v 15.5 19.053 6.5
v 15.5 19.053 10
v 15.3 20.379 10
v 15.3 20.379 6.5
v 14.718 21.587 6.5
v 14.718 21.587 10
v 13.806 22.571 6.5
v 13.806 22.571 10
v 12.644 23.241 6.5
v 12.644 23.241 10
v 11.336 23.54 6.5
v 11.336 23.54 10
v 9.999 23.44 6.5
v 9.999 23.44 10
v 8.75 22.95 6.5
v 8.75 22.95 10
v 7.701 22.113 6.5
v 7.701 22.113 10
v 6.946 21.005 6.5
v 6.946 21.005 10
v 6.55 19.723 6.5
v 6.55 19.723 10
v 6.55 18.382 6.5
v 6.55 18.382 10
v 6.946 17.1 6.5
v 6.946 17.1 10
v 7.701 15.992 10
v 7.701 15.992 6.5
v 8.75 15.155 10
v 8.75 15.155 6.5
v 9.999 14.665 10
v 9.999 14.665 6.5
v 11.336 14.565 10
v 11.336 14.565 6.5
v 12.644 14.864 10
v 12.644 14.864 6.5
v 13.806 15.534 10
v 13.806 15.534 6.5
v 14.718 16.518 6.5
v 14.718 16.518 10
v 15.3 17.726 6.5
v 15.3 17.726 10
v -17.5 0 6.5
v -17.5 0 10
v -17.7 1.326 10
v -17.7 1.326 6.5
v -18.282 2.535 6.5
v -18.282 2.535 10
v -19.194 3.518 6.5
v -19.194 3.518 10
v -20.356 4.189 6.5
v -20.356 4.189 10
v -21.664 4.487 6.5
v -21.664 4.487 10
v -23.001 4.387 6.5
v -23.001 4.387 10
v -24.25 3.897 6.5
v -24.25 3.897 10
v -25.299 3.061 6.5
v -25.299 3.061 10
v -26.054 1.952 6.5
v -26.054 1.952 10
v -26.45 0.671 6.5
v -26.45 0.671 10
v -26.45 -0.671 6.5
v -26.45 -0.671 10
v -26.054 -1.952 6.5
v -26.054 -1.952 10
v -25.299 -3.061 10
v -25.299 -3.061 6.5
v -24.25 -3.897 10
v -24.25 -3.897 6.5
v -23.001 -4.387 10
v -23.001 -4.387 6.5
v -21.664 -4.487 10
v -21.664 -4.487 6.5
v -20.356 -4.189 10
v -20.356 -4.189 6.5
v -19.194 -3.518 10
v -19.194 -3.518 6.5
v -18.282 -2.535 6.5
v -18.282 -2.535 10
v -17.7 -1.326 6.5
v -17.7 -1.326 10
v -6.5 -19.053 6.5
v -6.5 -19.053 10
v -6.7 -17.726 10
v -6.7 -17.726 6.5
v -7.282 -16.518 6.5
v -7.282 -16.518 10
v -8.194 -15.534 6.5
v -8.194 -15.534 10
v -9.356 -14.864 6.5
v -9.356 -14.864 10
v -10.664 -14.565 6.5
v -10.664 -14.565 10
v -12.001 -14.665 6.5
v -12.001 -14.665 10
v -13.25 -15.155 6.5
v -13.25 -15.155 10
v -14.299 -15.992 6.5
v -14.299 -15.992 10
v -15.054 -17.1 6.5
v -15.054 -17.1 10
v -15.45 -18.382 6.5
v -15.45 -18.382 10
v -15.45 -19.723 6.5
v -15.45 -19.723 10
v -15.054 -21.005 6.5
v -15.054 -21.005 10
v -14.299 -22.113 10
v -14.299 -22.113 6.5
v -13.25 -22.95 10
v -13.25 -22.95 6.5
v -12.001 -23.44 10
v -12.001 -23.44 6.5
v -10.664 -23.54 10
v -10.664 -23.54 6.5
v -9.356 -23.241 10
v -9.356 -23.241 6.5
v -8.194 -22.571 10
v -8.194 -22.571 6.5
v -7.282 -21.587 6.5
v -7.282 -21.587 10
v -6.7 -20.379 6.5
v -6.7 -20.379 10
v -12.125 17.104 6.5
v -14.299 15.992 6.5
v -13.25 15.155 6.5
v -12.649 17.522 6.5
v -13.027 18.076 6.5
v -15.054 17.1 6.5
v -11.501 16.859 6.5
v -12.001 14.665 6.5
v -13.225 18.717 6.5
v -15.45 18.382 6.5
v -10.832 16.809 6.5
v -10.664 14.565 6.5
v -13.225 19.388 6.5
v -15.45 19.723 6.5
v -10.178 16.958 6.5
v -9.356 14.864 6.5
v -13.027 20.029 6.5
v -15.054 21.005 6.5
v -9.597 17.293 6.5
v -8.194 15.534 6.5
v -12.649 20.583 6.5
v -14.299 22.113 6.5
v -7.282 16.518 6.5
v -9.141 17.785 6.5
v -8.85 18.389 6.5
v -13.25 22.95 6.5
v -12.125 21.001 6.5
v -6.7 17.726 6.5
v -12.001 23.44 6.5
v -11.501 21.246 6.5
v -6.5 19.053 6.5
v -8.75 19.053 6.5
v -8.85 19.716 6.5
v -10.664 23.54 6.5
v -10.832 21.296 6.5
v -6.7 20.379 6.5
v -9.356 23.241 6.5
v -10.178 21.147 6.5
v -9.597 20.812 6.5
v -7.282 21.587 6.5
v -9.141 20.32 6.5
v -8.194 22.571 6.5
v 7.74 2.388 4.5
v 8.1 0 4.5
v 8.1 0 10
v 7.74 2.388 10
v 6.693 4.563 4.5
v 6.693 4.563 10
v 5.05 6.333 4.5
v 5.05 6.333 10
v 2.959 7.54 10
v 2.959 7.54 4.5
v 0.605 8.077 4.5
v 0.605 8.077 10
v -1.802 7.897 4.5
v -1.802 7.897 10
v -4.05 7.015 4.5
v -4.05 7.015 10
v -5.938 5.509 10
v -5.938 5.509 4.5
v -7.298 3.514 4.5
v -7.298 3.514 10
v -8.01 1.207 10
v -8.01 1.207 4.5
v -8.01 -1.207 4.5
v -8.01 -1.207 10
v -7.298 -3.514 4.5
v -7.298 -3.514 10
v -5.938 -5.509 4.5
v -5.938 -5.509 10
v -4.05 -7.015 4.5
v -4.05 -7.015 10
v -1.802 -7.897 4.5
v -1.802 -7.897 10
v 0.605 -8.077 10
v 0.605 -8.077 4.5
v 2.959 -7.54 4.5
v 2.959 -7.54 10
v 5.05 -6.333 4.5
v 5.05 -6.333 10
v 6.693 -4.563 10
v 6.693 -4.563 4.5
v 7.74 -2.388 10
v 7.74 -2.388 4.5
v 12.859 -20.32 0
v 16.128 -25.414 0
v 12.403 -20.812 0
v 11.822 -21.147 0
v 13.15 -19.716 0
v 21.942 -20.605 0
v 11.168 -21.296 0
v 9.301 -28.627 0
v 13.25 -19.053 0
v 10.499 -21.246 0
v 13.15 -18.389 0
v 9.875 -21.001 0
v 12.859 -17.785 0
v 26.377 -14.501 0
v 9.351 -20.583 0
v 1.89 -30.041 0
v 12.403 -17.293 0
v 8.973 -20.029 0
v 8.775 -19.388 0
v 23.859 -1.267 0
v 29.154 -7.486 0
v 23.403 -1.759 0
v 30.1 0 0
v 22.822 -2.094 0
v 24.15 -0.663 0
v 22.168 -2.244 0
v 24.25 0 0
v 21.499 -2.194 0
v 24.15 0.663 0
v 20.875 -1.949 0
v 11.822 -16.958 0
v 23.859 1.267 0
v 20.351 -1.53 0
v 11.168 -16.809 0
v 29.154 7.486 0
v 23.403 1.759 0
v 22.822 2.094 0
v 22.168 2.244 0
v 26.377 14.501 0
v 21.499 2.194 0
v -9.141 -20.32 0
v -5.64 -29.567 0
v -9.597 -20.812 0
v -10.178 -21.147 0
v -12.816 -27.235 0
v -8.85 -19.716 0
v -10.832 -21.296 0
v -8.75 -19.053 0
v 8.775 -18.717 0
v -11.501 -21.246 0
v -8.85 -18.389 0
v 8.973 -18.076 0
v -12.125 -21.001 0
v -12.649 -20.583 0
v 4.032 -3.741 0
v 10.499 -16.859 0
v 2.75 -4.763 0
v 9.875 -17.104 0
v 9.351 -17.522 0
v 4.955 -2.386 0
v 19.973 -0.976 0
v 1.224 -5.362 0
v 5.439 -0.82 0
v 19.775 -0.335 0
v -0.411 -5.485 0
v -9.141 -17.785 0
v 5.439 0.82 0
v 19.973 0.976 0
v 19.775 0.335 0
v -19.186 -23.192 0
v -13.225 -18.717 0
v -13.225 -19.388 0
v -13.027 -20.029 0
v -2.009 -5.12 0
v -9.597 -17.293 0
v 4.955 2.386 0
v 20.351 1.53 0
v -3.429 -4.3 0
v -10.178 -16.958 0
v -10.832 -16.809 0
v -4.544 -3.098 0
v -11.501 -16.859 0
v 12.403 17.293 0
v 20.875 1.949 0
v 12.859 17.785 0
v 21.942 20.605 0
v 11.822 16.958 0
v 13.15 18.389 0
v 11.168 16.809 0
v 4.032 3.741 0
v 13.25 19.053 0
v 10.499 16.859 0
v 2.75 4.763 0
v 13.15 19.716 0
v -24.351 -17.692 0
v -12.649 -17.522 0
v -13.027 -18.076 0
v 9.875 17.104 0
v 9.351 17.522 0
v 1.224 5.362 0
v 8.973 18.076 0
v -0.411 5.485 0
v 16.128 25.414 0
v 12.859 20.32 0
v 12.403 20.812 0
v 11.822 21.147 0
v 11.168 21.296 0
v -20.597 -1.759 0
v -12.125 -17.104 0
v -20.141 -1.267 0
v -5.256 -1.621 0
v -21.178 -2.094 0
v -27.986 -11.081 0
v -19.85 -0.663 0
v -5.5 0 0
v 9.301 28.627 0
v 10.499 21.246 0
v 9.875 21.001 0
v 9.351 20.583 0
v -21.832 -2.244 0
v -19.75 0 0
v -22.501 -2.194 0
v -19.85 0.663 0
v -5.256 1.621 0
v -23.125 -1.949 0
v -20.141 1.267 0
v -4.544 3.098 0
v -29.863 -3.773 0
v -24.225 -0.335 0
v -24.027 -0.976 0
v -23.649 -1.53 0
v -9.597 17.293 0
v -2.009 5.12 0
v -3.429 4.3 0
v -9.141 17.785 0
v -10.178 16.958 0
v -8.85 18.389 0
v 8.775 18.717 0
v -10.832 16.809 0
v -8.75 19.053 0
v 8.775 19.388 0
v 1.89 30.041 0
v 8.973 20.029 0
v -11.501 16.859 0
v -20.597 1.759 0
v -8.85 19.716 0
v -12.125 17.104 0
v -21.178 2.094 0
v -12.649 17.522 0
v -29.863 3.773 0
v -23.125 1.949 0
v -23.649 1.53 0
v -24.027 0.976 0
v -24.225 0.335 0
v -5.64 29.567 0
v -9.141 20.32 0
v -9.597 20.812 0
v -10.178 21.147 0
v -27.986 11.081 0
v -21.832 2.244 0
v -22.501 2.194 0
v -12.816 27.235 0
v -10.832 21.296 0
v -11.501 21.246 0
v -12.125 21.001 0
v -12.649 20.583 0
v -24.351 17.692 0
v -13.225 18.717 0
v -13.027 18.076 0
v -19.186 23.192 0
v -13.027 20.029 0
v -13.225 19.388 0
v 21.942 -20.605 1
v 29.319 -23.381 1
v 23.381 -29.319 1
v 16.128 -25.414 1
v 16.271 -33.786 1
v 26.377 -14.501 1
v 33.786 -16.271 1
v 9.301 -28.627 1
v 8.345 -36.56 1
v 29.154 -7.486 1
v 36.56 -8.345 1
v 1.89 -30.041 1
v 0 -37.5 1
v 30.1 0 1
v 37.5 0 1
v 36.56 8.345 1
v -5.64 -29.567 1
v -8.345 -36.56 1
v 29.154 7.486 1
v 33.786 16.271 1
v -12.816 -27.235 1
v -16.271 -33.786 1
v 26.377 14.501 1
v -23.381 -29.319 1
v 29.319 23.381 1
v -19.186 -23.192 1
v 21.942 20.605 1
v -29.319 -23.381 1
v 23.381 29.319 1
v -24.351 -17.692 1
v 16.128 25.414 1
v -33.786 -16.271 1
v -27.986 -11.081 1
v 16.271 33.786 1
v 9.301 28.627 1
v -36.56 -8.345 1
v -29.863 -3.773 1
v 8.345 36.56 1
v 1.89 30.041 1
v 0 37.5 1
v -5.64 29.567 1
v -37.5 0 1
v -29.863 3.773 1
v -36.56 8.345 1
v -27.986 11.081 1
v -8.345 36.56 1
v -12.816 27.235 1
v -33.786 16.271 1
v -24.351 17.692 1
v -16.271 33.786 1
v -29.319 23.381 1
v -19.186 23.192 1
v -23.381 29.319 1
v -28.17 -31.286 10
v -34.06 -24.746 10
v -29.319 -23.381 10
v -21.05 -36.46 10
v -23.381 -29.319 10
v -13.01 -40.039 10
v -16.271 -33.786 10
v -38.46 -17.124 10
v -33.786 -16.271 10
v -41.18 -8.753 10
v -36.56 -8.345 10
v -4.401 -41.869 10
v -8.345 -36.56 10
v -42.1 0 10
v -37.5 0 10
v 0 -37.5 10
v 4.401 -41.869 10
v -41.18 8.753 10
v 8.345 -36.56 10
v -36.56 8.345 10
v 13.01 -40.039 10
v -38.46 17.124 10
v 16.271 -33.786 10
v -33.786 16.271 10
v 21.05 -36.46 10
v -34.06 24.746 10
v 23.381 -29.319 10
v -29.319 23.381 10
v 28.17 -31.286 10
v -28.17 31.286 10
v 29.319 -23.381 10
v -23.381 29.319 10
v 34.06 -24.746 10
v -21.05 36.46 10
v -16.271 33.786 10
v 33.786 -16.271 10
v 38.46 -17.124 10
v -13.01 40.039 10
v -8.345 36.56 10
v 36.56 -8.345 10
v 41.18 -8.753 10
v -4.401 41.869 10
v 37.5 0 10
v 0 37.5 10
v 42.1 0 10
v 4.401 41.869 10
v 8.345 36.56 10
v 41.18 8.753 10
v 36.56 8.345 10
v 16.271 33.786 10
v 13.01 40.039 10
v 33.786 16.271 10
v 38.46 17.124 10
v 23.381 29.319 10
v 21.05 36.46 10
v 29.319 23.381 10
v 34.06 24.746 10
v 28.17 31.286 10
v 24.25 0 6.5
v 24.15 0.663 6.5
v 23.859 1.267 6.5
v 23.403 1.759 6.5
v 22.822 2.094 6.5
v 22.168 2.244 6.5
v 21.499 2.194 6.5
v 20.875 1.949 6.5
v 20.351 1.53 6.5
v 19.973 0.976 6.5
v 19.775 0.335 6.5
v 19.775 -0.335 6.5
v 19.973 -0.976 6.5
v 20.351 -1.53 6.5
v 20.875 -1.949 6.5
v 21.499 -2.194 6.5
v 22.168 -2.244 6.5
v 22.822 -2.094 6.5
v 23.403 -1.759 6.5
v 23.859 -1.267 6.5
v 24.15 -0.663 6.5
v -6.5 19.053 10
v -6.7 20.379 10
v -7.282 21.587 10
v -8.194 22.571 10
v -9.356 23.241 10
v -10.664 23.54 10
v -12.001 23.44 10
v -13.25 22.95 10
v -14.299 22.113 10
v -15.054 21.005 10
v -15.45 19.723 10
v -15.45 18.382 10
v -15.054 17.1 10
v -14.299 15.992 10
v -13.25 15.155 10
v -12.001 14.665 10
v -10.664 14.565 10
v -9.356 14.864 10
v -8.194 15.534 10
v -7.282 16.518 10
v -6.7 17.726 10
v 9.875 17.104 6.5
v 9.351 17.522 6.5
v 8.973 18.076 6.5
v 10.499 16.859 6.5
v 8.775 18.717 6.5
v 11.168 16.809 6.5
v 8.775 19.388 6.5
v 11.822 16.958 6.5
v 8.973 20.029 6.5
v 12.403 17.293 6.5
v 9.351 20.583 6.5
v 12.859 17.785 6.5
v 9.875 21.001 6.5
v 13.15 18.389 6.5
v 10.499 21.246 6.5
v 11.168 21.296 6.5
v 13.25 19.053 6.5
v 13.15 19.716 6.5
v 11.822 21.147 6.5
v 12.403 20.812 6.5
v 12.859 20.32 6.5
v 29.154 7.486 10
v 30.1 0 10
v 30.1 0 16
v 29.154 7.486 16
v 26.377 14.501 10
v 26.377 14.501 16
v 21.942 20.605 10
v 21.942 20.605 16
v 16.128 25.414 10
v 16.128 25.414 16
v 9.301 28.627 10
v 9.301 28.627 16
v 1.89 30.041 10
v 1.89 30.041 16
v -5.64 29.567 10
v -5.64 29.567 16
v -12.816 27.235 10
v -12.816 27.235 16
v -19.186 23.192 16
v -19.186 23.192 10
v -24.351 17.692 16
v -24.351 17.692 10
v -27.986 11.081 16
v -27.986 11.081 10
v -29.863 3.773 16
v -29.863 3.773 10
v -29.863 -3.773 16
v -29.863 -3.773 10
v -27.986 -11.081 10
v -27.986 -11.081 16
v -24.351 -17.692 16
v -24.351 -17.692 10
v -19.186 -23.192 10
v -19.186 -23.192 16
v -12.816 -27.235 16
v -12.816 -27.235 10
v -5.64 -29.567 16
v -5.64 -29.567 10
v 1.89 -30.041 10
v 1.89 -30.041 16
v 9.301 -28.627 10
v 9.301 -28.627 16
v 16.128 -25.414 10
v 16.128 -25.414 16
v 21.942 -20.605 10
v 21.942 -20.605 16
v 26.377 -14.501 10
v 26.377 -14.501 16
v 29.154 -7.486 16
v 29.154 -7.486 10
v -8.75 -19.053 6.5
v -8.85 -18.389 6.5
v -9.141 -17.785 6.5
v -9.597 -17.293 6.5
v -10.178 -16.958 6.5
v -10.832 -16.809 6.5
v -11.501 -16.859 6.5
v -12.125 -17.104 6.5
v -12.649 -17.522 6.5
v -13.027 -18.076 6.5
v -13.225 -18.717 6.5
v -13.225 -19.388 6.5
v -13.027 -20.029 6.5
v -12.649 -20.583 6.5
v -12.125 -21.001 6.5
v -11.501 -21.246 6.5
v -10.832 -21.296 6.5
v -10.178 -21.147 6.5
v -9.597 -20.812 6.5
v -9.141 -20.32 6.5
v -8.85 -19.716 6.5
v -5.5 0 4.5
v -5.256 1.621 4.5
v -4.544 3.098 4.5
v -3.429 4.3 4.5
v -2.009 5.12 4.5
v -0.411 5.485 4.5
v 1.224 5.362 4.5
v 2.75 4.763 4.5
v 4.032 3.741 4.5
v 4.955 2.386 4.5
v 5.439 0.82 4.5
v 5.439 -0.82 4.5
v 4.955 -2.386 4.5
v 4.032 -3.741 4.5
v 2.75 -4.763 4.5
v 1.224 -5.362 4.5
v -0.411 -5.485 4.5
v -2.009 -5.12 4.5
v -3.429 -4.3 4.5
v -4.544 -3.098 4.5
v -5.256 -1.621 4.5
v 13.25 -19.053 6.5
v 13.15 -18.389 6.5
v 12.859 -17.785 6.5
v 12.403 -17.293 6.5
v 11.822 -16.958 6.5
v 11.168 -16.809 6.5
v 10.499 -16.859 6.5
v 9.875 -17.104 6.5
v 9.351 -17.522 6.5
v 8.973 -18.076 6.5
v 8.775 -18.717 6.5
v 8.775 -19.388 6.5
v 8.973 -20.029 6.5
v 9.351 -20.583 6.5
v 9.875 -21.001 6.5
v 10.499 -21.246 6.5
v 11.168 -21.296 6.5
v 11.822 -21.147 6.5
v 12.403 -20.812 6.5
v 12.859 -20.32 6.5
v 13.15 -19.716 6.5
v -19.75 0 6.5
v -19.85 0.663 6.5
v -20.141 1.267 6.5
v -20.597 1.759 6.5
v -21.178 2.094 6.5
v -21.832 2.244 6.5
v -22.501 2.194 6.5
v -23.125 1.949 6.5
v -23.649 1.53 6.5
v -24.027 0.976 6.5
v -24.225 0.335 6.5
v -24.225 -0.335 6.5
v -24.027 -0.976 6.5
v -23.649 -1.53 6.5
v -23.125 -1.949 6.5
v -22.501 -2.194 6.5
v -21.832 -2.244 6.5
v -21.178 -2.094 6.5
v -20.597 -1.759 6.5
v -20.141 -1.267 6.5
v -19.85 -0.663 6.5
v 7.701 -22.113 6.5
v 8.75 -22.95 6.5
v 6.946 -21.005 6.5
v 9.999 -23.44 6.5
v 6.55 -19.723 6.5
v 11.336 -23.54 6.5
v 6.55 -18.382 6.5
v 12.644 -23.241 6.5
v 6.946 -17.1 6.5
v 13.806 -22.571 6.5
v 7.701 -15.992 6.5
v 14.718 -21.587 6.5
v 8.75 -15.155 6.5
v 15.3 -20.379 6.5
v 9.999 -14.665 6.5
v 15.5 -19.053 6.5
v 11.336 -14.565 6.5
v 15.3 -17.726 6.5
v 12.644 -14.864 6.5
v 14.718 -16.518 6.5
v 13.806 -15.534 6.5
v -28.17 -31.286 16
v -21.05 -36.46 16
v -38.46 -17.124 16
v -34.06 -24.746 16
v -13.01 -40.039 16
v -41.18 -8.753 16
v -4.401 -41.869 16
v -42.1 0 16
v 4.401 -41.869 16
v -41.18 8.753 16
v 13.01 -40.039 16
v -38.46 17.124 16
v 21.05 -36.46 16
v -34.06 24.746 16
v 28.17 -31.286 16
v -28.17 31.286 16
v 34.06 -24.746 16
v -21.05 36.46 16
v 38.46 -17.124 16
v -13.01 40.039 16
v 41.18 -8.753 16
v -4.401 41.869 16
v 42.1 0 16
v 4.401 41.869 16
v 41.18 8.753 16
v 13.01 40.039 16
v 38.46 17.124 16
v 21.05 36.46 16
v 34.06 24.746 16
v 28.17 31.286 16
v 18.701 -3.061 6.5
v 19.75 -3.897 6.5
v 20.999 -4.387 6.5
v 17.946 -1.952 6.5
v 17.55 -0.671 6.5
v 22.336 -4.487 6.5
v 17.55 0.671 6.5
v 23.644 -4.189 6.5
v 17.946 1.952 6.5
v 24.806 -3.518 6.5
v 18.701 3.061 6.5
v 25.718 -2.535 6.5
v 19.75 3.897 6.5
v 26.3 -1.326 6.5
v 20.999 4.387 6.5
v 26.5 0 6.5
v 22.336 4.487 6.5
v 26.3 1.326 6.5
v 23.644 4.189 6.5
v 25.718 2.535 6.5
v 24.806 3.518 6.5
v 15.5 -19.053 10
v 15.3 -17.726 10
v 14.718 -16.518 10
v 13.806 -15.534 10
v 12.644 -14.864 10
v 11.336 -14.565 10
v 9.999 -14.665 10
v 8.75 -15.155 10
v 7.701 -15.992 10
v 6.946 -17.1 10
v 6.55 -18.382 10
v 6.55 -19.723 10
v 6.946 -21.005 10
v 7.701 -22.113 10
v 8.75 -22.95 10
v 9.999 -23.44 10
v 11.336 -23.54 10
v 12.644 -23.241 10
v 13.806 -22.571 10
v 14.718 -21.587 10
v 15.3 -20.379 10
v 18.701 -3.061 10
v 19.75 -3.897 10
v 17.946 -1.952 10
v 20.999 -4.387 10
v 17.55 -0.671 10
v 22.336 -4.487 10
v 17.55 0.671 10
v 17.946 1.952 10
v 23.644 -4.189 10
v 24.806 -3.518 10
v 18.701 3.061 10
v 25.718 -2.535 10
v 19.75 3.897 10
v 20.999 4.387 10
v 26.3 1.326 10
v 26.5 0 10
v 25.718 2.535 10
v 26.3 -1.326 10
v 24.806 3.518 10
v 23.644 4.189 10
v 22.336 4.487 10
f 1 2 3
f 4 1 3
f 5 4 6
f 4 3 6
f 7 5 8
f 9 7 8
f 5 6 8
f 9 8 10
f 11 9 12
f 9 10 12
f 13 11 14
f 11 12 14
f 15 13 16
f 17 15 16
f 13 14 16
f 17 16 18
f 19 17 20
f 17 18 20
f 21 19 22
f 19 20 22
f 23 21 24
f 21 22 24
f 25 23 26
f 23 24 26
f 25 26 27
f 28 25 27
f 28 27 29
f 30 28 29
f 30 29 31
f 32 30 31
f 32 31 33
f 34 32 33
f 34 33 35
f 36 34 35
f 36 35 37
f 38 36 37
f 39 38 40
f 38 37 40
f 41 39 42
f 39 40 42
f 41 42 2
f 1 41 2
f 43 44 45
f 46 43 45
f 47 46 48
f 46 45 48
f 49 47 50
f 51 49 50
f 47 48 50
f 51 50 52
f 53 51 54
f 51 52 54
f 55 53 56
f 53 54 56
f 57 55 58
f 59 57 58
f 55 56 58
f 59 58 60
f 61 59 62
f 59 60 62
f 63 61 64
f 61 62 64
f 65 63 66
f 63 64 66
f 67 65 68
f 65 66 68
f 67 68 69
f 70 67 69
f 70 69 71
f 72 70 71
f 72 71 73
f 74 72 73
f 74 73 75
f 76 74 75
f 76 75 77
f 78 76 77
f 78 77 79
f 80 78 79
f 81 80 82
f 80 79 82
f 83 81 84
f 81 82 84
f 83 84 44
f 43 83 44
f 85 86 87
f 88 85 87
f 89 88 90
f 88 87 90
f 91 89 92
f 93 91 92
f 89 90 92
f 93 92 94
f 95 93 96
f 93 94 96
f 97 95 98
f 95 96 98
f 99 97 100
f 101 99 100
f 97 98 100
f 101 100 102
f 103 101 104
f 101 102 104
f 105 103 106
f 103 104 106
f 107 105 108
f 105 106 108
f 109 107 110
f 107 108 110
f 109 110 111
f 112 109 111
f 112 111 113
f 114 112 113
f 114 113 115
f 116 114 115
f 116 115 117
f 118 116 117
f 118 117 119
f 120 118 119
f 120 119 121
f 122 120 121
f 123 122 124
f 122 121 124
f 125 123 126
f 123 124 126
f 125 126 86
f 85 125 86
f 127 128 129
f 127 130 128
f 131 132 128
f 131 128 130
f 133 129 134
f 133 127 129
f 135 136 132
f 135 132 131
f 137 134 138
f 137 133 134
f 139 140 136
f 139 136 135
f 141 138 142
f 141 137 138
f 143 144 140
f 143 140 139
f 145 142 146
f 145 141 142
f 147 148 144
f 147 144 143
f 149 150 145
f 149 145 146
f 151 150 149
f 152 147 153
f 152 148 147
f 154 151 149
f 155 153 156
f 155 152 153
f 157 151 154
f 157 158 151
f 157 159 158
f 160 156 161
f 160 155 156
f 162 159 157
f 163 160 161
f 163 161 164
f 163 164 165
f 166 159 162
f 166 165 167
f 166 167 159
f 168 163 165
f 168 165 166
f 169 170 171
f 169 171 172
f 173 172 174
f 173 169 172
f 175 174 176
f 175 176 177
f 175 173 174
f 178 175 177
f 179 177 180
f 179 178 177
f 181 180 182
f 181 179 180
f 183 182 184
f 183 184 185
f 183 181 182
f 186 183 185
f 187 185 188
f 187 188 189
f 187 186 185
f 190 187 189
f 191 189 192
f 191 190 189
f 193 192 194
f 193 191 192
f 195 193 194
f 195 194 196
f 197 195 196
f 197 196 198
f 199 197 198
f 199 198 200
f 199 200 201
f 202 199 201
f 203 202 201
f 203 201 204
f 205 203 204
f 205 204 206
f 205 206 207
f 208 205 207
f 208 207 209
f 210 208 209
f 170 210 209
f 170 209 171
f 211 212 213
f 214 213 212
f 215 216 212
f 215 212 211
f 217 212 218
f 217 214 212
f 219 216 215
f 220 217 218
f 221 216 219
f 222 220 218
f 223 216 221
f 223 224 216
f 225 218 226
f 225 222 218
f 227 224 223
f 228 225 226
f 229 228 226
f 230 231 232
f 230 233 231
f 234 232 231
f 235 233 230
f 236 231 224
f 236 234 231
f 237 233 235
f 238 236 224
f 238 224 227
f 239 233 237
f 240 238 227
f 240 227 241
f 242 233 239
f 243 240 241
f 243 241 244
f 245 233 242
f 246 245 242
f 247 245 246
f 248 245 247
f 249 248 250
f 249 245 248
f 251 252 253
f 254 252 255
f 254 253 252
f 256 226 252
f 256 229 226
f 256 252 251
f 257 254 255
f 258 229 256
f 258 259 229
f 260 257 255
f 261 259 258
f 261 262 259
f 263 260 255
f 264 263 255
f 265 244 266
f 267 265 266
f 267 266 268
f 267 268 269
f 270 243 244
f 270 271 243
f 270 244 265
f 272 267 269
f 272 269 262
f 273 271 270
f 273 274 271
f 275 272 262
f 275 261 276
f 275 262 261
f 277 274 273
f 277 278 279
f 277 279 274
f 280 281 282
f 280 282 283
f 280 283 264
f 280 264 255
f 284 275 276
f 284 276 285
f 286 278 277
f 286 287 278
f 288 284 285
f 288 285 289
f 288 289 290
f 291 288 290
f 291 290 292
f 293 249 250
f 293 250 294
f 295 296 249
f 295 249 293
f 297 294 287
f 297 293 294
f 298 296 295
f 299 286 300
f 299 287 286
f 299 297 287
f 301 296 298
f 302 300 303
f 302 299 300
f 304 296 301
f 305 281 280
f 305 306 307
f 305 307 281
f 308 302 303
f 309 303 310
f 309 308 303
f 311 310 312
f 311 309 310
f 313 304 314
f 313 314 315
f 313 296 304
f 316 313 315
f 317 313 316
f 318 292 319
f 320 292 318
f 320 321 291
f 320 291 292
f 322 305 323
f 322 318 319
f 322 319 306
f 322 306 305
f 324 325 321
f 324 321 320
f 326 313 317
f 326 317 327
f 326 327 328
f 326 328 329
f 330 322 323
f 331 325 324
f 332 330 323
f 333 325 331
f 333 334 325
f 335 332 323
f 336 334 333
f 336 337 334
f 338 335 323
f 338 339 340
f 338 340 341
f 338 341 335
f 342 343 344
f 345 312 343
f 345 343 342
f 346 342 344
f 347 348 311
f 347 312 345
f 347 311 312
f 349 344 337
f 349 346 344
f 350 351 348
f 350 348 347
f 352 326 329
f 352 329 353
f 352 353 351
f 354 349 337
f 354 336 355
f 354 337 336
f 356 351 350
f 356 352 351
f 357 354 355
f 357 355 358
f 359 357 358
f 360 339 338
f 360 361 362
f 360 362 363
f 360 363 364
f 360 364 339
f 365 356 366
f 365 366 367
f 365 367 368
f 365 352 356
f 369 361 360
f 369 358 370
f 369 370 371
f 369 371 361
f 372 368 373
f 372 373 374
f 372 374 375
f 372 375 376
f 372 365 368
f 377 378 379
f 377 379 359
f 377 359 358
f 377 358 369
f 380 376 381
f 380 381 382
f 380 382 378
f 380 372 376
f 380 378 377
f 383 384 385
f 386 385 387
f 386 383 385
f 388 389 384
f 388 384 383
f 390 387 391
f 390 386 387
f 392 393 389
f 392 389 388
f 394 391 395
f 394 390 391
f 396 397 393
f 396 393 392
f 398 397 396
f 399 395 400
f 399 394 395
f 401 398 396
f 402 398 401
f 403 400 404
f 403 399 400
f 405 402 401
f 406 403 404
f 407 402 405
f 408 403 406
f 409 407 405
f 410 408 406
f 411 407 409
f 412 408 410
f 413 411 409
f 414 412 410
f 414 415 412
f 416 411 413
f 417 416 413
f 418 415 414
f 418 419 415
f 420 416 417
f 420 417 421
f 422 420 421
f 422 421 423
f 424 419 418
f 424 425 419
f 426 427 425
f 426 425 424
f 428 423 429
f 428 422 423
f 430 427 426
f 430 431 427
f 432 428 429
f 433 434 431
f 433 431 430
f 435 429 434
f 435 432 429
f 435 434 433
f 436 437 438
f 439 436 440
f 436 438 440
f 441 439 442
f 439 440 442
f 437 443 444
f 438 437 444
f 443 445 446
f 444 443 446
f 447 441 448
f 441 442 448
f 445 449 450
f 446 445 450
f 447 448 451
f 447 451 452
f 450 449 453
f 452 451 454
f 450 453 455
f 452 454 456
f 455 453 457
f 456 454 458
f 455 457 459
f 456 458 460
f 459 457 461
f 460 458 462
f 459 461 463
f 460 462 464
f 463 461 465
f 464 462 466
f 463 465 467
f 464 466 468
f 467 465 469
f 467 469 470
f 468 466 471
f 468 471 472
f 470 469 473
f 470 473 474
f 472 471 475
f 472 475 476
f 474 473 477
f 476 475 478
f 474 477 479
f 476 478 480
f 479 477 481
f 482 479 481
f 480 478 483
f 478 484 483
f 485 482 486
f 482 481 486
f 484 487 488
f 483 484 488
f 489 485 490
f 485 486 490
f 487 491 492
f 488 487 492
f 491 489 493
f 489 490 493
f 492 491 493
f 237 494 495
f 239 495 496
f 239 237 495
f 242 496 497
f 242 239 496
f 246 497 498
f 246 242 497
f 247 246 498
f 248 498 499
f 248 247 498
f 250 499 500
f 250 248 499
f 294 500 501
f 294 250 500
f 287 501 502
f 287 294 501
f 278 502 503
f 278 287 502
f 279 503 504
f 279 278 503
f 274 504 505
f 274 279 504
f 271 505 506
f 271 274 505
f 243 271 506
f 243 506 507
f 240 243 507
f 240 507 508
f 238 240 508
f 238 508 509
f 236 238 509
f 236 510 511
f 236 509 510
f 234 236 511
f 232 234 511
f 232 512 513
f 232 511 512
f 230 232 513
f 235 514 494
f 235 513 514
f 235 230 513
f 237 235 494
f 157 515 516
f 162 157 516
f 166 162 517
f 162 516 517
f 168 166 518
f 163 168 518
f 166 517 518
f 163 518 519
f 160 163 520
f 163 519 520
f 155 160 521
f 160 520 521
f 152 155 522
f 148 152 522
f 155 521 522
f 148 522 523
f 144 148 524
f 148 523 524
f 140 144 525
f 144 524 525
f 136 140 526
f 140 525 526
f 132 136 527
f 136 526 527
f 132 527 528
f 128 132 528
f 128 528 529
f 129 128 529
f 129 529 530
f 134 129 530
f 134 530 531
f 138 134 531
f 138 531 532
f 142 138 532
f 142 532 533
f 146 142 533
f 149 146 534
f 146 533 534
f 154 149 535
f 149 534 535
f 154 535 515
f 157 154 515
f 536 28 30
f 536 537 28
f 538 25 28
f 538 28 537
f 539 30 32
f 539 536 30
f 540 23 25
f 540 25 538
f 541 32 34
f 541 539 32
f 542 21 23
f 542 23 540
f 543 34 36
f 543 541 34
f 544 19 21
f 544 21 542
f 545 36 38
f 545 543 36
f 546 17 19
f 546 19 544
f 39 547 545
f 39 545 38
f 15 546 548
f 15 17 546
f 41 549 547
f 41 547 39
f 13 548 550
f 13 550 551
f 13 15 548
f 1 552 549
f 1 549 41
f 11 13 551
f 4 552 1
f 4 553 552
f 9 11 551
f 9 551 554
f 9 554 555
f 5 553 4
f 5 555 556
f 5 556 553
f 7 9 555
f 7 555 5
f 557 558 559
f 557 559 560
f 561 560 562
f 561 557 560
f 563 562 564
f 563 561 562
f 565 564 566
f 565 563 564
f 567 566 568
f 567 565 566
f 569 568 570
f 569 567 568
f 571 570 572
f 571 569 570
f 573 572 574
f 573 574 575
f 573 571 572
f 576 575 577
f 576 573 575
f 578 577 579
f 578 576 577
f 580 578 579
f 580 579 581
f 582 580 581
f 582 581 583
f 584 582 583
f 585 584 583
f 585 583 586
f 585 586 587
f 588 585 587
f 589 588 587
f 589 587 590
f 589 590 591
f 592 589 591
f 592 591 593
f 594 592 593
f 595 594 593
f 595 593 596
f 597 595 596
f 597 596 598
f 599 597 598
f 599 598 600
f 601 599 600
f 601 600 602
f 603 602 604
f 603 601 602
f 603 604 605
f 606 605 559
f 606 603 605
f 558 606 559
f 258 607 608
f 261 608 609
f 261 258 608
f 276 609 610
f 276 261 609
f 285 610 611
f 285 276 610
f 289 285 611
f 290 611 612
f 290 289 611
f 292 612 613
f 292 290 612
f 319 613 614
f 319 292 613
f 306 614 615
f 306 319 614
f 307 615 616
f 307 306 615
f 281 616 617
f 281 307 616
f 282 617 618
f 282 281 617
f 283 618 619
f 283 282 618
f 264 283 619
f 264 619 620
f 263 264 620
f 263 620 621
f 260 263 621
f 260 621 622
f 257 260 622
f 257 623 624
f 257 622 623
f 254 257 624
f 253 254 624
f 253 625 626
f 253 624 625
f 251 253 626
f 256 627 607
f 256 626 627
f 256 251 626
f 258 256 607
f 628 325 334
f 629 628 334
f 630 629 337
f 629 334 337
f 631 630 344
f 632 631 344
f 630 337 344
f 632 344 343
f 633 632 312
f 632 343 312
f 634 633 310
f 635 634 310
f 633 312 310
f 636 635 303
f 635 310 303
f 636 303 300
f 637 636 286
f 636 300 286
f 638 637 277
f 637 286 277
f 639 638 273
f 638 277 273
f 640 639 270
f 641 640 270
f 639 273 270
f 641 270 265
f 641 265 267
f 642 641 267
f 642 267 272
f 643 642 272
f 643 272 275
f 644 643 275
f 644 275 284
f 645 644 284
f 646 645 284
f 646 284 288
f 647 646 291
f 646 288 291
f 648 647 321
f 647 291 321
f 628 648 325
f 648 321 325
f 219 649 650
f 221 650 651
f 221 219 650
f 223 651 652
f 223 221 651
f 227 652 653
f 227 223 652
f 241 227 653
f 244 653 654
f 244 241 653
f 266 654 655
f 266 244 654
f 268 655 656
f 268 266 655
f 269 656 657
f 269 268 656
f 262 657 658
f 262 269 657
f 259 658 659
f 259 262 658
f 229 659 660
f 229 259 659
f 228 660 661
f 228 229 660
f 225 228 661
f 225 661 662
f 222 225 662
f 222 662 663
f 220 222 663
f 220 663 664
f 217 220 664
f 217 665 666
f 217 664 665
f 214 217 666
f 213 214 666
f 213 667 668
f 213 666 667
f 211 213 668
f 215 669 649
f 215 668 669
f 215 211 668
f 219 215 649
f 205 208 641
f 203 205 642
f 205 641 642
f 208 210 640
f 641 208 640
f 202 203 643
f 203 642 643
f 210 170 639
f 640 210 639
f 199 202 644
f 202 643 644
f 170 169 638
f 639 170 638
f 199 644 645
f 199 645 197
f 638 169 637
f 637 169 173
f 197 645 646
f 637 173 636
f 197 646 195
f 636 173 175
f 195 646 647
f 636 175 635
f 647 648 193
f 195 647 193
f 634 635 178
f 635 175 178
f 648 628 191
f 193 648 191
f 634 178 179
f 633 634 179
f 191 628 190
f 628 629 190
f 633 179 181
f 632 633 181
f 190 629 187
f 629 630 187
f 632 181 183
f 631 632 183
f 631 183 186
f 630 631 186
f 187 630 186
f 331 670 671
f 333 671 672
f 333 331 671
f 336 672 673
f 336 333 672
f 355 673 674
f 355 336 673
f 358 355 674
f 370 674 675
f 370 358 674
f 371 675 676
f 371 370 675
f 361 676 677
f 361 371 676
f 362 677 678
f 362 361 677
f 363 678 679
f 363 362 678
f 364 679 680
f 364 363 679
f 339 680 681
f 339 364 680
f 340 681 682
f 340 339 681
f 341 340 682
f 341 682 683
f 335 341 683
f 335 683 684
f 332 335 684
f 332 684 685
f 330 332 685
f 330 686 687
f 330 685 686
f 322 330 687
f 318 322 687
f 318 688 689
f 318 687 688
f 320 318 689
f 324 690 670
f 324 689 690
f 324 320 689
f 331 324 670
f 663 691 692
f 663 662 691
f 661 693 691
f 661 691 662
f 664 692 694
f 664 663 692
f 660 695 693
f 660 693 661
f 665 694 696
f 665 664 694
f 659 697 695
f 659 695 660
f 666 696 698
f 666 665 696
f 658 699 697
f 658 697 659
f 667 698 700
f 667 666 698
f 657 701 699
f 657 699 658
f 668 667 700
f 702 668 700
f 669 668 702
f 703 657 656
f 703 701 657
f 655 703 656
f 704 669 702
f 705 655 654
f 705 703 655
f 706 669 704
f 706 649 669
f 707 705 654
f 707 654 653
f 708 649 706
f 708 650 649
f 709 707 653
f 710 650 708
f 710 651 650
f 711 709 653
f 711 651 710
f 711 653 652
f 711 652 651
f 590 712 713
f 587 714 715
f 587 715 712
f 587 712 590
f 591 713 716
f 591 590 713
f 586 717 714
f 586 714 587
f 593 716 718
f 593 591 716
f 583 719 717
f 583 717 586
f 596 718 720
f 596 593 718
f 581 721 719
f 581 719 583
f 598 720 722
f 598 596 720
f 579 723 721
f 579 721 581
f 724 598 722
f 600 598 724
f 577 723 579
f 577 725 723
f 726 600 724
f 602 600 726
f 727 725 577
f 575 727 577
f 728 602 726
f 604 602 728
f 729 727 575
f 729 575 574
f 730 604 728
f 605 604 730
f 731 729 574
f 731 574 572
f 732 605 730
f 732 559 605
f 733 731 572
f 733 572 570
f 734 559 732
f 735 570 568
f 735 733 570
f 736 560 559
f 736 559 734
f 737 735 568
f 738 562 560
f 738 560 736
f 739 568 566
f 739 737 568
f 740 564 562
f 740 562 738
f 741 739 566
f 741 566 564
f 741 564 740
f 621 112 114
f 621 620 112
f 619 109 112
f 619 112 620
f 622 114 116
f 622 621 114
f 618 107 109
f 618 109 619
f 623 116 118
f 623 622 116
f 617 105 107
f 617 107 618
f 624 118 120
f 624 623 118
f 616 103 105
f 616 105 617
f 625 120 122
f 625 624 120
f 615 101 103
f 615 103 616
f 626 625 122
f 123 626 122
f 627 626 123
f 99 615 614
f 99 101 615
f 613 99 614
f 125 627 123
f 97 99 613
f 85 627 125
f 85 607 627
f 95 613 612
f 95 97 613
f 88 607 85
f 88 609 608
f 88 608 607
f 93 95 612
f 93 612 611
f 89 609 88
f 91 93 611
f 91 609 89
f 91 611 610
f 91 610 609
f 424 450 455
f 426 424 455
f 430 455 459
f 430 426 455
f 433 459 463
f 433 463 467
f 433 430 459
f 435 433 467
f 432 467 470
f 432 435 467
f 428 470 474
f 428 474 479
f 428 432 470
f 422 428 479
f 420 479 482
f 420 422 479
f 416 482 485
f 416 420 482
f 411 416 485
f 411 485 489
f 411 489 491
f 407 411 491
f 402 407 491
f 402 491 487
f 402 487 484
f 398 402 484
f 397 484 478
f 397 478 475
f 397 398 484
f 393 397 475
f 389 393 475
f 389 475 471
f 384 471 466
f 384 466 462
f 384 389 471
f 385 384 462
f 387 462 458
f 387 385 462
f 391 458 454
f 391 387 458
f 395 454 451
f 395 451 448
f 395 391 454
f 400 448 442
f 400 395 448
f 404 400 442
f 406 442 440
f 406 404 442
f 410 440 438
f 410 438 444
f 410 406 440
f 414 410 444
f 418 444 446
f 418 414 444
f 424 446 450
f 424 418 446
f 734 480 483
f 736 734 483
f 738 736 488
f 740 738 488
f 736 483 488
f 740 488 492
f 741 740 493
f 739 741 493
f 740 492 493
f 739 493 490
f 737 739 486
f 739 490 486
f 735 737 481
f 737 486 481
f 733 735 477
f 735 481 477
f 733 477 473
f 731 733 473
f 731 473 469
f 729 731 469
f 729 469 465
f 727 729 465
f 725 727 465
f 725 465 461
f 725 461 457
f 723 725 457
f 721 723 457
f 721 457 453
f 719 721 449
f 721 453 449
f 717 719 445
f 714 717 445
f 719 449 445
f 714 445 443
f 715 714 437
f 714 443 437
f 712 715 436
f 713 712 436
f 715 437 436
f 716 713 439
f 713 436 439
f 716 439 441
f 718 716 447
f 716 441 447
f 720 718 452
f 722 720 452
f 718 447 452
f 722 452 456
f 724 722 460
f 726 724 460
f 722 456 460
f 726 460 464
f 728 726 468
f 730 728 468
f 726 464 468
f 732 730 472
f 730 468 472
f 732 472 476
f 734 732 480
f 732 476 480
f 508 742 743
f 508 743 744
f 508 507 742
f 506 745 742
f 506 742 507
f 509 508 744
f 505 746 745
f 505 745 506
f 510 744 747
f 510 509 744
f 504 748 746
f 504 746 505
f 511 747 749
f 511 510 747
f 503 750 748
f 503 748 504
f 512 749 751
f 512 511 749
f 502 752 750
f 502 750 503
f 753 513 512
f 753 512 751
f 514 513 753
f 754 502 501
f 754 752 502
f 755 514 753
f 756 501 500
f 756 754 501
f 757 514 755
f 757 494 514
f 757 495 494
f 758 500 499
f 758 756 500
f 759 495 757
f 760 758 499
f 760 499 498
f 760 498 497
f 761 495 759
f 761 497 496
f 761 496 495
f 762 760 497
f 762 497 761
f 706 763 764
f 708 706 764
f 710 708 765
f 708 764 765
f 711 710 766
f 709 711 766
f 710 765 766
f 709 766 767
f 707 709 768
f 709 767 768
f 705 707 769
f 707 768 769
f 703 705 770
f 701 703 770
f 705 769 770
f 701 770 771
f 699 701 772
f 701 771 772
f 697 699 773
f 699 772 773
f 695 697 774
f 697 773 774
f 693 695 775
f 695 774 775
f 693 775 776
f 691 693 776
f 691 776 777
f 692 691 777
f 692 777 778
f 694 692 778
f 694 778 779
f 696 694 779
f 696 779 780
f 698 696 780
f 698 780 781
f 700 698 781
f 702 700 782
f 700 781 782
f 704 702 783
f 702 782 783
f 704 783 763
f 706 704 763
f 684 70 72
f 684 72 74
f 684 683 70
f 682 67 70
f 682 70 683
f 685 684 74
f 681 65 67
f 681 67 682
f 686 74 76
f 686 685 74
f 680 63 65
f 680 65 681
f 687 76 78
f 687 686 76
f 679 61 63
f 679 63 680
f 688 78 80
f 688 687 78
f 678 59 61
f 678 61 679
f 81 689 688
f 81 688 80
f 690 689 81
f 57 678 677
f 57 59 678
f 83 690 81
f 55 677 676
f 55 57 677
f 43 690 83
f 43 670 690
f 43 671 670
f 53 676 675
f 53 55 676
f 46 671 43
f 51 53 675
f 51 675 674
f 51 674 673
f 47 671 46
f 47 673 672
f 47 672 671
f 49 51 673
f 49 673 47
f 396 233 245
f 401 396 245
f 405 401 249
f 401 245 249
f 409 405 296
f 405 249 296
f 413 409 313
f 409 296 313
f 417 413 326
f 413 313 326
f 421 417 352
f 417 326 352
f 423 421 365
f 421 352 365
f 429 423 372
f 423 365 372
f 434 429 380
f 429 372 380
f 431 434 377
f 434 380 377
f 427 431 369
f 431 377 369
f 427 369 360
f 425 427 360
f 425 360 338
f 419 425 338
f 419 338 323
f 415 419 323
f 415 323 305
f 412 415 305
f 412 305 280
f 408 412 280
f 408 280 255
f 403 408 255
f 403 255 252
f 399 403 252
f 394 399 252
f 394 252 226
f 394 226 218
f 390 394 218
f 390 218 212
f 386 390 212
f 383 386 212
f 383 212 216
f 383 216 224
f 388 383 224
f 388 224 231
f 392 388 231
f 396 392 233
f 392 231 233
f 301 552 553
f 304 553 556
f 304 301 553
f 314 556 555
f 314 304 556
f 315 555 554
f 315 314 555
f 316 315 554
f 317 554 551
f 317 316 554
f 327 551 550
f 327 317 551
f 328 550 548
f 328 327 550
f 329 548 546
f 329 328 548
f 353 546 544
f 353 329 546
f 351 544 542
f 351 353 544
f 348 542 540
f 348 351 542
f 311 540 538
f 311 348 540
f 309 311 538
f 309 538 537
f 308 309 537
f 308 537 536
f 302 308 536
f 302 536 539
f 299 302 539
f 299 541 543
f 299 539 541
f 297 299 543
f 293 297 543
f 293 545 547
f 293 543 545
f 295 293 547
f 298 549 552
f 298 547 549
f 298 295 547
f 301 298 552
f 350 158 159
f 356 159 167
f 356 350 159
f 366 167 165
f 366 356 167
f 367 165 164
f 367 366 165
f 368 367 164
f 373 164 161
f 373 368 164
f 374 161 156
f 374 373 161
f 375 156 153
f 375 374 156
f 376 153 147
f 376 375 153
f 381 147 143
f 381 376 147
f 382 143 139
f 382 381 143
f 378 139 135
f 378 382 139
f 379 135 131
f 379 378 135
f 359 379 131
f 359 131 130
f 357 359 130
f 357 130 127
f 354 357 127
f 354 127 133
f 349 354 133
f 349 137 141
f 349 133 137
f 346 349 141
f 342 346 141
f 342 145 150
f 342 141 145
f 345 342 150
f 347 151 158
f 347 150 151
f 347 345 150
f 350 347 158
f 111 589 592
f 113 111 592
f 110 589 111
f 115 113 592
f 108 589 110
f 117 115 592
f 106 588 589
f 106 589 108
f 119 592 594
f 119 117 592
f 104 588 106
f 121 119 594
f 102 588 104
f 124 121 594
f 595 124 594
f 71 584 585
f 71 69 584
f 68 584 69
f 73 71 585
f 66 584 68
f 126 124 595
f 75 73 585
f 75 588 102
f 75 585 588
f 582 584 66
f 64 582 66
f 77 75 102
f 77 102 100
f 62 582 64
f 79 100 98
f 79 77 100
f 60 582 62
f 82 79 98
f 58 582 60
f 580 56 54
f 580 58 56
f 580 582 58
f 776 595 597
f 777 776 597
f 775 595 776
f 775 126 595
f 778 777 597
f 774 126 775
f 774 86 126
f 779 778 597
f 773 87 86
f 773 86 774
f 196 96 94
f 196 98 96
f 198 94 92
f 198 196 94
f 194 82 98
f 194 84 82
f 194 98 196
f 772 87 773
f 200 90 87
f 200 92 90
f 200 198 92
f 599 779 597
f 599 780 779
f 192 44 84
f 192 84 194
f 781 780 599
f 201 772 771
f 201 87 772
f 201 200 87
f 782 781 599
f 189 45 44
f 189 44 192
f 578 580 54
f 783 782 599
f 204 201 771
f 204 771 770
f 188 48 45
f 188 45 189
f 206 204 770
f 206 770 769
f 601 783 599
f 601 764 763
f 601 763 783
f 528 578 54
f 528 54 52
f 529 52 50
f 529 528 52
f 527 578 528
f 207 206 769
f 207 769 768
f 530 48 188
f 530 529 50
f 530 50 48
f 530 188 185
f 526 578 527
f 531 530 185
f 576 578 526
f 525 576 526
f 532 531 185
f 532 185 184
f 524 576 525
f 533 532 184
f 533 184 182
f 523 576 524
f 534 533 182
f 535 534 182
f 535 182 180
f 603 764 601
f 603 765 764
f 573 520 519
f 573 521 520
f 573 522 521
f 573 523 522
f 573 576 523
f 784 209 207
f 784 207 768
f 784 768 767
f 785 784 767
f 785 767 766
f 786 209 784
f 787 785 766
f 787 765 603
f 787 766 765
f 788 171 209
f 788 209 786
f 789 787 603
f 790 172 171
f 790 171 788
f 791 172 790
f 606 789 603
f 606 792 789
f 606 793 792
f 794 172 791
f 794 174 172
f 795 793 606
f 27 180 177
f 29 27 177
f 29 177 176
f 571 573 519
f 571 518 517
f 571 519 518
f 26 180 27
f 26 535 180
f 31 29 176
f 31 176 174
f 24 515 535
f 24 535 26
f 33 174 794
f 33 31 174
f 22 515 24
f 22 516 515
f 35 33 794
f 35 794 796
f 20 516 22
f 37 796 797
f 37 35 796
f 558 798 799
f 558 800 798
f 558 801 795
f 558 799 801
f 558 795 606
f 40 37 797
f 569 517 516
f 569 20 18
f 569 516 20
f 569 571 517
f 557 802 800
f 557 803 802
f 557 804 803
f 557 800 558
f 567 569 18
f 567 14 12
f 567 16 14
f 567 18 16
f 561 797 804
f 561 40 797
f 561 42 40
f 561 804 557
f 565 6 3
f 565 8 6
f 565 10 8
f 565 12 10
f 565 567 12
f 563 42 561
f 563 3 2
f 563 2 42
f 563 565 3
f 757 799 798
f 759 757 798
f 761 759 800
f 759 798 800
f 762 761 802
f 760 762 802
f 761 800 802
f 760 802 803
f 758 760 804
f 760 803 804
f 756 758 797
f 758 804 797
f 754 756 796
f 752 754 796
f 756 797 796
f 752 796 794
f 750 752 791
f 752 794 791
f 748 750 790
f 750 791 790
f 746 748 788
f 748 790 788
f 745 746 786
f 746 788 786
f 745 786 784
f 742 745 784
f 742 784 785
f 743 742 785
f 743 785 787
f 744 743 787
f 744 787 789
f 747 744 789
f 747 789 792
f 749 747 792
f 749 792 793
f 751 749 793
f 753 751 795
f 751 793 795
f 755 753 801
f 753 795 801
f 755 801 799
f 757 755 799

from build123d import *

# Parameters (mm, degrees)
ESQUISSE1_R             = 30.1
ESQUISSE1_R_2           = 2.25
ESQUISSE1_R_3           = 8.1
BOSS_EXTRU_1_DEPTH      = 10
ESQUISSE2_R             = 8.1
ESQUISSE2_R_2           = 5.5
BOSS_EXTRU_2_DEPTH      = 4.5
ESQUISSE3_R             = 4.5
ENL_V_MAT_EXTRU_1_DEPTH = 3.5
ESQUISSE4_R             = 42.1
ESQUISSE4_R_2           = 30.1
BOSS_EXTRU_3_DEPTH      = 6
BOSS_EXTRU_4_START      = 9
ESQUISSE6_R             = 37.5
ESQUISSE6_R_2           = 30.1
BOSS_EXTRU_4_DEPTH      = 9


with BuildPart() as part:
    # Esquisse1 → Boss.-Extru.1 (new body)
    with BuildSketch(Plane.XY):
        Circle(ESQUISSE1_R)
        with Locations((22, 0)):
            Circle(ESQUISSE1_R_2, mode=Mode.SUBTRACT)
        with Locations((11, -19.052558883)):
            Circle(ESQUISSE1_R_2, mode=Mode.SUBTRACT)
        with Locations((-11, -19.052558883)):
            Circle(ESQUISSE1_R_2, mode=Mode.SUBTRACT)
        with Locations((-22, 0)):
            Circle(ESQUISSE1_R_2, mode=Mode.SUBTRACT)
        with Locations((-11, 19.052558883)):
            Circle(ESQUISSE1_R_2, mode=Mode.SUBTRACT)
        with Locations((11, 19.052558883)):
            Circle(ESQUISSE1_R_2, mode=Mode.SUBTRACT)
        Circle(ESQUISSE1_R_3, mode=Mode.SUBTRACT)
    extrude(amount=BOSS_EXTRU_1_DEPTH)

    # Esquisse2 → Boss.-Extru.2 (add)
    with BuildSketch(Plane(origin=(0, 0, 0), x_dir=(-1, 0, 0), z_dir=(0, 0, -1))):
        Circle(ESQUISSE2_R)
        Circle(ESQUISSE2_R_2, mode=Mode.SUBTRACT)
    extrude(amount=-BOSS_EXTRU_2_DEPTH)

    # Esquisse3 → Enlèv. mat.-Extru.1 (cut)
    with BuildSketch(Plane.XY.offset(10)):
        with Locations((-11, 19.052558883)):
            Circle(ESQUISSE3_R)
        with Locations((11, 19.052558883)):
            Circle(ESQUISSE3_R)
        with Locations((22, 0)):
            Circle(ESQUISSE3_R)
        with Locations((11, -19.052558883)):
            Circle(ESQUISSE3_R)
        with Locations((-11, -19.052558883)):
            Circle(ESQUISSE3_R)
        with Locations((-22, 0)):
            Circle(ESQUISSE3_R)
    extrude(amount=-ENL_V_MAT_EXTRU_1_DEPTH, mode=Mode.SUBTRACT)



with BuildPart() as body_2:
    # Esquisse4 → Boss.-Extru.3 (new body)
    with BuildSketch(Plane.XY.offset(10)):
        Circle(ESQUISSE4_R)
        Circle(ESQUISSE4_R_2, mode=Mode.SUBTRACT)
    extrude(amount=BOSS_EXTRU_3_DEPTH)


with BuildPart() as part_1:
    add(part.part)

    add(body_2.part)  # Boss.-Extru.4 merges body 2
    # Esquisse6 → Boss.-Extru.4 (add)
    with BuildSketch(Plane(origin=(0, 0, 10), x_dir=(-1, 0, 0), z_dir=(0, 0, -1)).offset(BOSS_EXTRU_4_START)):
        Circle(ESQUISSE6_R)
        Circle(ESQUISSE6_R_2, mode=Mode.SUBTRACT)
    extrude(amount=-BOSS_EXTRU_4_DEPTH)


solid = part_1.part
